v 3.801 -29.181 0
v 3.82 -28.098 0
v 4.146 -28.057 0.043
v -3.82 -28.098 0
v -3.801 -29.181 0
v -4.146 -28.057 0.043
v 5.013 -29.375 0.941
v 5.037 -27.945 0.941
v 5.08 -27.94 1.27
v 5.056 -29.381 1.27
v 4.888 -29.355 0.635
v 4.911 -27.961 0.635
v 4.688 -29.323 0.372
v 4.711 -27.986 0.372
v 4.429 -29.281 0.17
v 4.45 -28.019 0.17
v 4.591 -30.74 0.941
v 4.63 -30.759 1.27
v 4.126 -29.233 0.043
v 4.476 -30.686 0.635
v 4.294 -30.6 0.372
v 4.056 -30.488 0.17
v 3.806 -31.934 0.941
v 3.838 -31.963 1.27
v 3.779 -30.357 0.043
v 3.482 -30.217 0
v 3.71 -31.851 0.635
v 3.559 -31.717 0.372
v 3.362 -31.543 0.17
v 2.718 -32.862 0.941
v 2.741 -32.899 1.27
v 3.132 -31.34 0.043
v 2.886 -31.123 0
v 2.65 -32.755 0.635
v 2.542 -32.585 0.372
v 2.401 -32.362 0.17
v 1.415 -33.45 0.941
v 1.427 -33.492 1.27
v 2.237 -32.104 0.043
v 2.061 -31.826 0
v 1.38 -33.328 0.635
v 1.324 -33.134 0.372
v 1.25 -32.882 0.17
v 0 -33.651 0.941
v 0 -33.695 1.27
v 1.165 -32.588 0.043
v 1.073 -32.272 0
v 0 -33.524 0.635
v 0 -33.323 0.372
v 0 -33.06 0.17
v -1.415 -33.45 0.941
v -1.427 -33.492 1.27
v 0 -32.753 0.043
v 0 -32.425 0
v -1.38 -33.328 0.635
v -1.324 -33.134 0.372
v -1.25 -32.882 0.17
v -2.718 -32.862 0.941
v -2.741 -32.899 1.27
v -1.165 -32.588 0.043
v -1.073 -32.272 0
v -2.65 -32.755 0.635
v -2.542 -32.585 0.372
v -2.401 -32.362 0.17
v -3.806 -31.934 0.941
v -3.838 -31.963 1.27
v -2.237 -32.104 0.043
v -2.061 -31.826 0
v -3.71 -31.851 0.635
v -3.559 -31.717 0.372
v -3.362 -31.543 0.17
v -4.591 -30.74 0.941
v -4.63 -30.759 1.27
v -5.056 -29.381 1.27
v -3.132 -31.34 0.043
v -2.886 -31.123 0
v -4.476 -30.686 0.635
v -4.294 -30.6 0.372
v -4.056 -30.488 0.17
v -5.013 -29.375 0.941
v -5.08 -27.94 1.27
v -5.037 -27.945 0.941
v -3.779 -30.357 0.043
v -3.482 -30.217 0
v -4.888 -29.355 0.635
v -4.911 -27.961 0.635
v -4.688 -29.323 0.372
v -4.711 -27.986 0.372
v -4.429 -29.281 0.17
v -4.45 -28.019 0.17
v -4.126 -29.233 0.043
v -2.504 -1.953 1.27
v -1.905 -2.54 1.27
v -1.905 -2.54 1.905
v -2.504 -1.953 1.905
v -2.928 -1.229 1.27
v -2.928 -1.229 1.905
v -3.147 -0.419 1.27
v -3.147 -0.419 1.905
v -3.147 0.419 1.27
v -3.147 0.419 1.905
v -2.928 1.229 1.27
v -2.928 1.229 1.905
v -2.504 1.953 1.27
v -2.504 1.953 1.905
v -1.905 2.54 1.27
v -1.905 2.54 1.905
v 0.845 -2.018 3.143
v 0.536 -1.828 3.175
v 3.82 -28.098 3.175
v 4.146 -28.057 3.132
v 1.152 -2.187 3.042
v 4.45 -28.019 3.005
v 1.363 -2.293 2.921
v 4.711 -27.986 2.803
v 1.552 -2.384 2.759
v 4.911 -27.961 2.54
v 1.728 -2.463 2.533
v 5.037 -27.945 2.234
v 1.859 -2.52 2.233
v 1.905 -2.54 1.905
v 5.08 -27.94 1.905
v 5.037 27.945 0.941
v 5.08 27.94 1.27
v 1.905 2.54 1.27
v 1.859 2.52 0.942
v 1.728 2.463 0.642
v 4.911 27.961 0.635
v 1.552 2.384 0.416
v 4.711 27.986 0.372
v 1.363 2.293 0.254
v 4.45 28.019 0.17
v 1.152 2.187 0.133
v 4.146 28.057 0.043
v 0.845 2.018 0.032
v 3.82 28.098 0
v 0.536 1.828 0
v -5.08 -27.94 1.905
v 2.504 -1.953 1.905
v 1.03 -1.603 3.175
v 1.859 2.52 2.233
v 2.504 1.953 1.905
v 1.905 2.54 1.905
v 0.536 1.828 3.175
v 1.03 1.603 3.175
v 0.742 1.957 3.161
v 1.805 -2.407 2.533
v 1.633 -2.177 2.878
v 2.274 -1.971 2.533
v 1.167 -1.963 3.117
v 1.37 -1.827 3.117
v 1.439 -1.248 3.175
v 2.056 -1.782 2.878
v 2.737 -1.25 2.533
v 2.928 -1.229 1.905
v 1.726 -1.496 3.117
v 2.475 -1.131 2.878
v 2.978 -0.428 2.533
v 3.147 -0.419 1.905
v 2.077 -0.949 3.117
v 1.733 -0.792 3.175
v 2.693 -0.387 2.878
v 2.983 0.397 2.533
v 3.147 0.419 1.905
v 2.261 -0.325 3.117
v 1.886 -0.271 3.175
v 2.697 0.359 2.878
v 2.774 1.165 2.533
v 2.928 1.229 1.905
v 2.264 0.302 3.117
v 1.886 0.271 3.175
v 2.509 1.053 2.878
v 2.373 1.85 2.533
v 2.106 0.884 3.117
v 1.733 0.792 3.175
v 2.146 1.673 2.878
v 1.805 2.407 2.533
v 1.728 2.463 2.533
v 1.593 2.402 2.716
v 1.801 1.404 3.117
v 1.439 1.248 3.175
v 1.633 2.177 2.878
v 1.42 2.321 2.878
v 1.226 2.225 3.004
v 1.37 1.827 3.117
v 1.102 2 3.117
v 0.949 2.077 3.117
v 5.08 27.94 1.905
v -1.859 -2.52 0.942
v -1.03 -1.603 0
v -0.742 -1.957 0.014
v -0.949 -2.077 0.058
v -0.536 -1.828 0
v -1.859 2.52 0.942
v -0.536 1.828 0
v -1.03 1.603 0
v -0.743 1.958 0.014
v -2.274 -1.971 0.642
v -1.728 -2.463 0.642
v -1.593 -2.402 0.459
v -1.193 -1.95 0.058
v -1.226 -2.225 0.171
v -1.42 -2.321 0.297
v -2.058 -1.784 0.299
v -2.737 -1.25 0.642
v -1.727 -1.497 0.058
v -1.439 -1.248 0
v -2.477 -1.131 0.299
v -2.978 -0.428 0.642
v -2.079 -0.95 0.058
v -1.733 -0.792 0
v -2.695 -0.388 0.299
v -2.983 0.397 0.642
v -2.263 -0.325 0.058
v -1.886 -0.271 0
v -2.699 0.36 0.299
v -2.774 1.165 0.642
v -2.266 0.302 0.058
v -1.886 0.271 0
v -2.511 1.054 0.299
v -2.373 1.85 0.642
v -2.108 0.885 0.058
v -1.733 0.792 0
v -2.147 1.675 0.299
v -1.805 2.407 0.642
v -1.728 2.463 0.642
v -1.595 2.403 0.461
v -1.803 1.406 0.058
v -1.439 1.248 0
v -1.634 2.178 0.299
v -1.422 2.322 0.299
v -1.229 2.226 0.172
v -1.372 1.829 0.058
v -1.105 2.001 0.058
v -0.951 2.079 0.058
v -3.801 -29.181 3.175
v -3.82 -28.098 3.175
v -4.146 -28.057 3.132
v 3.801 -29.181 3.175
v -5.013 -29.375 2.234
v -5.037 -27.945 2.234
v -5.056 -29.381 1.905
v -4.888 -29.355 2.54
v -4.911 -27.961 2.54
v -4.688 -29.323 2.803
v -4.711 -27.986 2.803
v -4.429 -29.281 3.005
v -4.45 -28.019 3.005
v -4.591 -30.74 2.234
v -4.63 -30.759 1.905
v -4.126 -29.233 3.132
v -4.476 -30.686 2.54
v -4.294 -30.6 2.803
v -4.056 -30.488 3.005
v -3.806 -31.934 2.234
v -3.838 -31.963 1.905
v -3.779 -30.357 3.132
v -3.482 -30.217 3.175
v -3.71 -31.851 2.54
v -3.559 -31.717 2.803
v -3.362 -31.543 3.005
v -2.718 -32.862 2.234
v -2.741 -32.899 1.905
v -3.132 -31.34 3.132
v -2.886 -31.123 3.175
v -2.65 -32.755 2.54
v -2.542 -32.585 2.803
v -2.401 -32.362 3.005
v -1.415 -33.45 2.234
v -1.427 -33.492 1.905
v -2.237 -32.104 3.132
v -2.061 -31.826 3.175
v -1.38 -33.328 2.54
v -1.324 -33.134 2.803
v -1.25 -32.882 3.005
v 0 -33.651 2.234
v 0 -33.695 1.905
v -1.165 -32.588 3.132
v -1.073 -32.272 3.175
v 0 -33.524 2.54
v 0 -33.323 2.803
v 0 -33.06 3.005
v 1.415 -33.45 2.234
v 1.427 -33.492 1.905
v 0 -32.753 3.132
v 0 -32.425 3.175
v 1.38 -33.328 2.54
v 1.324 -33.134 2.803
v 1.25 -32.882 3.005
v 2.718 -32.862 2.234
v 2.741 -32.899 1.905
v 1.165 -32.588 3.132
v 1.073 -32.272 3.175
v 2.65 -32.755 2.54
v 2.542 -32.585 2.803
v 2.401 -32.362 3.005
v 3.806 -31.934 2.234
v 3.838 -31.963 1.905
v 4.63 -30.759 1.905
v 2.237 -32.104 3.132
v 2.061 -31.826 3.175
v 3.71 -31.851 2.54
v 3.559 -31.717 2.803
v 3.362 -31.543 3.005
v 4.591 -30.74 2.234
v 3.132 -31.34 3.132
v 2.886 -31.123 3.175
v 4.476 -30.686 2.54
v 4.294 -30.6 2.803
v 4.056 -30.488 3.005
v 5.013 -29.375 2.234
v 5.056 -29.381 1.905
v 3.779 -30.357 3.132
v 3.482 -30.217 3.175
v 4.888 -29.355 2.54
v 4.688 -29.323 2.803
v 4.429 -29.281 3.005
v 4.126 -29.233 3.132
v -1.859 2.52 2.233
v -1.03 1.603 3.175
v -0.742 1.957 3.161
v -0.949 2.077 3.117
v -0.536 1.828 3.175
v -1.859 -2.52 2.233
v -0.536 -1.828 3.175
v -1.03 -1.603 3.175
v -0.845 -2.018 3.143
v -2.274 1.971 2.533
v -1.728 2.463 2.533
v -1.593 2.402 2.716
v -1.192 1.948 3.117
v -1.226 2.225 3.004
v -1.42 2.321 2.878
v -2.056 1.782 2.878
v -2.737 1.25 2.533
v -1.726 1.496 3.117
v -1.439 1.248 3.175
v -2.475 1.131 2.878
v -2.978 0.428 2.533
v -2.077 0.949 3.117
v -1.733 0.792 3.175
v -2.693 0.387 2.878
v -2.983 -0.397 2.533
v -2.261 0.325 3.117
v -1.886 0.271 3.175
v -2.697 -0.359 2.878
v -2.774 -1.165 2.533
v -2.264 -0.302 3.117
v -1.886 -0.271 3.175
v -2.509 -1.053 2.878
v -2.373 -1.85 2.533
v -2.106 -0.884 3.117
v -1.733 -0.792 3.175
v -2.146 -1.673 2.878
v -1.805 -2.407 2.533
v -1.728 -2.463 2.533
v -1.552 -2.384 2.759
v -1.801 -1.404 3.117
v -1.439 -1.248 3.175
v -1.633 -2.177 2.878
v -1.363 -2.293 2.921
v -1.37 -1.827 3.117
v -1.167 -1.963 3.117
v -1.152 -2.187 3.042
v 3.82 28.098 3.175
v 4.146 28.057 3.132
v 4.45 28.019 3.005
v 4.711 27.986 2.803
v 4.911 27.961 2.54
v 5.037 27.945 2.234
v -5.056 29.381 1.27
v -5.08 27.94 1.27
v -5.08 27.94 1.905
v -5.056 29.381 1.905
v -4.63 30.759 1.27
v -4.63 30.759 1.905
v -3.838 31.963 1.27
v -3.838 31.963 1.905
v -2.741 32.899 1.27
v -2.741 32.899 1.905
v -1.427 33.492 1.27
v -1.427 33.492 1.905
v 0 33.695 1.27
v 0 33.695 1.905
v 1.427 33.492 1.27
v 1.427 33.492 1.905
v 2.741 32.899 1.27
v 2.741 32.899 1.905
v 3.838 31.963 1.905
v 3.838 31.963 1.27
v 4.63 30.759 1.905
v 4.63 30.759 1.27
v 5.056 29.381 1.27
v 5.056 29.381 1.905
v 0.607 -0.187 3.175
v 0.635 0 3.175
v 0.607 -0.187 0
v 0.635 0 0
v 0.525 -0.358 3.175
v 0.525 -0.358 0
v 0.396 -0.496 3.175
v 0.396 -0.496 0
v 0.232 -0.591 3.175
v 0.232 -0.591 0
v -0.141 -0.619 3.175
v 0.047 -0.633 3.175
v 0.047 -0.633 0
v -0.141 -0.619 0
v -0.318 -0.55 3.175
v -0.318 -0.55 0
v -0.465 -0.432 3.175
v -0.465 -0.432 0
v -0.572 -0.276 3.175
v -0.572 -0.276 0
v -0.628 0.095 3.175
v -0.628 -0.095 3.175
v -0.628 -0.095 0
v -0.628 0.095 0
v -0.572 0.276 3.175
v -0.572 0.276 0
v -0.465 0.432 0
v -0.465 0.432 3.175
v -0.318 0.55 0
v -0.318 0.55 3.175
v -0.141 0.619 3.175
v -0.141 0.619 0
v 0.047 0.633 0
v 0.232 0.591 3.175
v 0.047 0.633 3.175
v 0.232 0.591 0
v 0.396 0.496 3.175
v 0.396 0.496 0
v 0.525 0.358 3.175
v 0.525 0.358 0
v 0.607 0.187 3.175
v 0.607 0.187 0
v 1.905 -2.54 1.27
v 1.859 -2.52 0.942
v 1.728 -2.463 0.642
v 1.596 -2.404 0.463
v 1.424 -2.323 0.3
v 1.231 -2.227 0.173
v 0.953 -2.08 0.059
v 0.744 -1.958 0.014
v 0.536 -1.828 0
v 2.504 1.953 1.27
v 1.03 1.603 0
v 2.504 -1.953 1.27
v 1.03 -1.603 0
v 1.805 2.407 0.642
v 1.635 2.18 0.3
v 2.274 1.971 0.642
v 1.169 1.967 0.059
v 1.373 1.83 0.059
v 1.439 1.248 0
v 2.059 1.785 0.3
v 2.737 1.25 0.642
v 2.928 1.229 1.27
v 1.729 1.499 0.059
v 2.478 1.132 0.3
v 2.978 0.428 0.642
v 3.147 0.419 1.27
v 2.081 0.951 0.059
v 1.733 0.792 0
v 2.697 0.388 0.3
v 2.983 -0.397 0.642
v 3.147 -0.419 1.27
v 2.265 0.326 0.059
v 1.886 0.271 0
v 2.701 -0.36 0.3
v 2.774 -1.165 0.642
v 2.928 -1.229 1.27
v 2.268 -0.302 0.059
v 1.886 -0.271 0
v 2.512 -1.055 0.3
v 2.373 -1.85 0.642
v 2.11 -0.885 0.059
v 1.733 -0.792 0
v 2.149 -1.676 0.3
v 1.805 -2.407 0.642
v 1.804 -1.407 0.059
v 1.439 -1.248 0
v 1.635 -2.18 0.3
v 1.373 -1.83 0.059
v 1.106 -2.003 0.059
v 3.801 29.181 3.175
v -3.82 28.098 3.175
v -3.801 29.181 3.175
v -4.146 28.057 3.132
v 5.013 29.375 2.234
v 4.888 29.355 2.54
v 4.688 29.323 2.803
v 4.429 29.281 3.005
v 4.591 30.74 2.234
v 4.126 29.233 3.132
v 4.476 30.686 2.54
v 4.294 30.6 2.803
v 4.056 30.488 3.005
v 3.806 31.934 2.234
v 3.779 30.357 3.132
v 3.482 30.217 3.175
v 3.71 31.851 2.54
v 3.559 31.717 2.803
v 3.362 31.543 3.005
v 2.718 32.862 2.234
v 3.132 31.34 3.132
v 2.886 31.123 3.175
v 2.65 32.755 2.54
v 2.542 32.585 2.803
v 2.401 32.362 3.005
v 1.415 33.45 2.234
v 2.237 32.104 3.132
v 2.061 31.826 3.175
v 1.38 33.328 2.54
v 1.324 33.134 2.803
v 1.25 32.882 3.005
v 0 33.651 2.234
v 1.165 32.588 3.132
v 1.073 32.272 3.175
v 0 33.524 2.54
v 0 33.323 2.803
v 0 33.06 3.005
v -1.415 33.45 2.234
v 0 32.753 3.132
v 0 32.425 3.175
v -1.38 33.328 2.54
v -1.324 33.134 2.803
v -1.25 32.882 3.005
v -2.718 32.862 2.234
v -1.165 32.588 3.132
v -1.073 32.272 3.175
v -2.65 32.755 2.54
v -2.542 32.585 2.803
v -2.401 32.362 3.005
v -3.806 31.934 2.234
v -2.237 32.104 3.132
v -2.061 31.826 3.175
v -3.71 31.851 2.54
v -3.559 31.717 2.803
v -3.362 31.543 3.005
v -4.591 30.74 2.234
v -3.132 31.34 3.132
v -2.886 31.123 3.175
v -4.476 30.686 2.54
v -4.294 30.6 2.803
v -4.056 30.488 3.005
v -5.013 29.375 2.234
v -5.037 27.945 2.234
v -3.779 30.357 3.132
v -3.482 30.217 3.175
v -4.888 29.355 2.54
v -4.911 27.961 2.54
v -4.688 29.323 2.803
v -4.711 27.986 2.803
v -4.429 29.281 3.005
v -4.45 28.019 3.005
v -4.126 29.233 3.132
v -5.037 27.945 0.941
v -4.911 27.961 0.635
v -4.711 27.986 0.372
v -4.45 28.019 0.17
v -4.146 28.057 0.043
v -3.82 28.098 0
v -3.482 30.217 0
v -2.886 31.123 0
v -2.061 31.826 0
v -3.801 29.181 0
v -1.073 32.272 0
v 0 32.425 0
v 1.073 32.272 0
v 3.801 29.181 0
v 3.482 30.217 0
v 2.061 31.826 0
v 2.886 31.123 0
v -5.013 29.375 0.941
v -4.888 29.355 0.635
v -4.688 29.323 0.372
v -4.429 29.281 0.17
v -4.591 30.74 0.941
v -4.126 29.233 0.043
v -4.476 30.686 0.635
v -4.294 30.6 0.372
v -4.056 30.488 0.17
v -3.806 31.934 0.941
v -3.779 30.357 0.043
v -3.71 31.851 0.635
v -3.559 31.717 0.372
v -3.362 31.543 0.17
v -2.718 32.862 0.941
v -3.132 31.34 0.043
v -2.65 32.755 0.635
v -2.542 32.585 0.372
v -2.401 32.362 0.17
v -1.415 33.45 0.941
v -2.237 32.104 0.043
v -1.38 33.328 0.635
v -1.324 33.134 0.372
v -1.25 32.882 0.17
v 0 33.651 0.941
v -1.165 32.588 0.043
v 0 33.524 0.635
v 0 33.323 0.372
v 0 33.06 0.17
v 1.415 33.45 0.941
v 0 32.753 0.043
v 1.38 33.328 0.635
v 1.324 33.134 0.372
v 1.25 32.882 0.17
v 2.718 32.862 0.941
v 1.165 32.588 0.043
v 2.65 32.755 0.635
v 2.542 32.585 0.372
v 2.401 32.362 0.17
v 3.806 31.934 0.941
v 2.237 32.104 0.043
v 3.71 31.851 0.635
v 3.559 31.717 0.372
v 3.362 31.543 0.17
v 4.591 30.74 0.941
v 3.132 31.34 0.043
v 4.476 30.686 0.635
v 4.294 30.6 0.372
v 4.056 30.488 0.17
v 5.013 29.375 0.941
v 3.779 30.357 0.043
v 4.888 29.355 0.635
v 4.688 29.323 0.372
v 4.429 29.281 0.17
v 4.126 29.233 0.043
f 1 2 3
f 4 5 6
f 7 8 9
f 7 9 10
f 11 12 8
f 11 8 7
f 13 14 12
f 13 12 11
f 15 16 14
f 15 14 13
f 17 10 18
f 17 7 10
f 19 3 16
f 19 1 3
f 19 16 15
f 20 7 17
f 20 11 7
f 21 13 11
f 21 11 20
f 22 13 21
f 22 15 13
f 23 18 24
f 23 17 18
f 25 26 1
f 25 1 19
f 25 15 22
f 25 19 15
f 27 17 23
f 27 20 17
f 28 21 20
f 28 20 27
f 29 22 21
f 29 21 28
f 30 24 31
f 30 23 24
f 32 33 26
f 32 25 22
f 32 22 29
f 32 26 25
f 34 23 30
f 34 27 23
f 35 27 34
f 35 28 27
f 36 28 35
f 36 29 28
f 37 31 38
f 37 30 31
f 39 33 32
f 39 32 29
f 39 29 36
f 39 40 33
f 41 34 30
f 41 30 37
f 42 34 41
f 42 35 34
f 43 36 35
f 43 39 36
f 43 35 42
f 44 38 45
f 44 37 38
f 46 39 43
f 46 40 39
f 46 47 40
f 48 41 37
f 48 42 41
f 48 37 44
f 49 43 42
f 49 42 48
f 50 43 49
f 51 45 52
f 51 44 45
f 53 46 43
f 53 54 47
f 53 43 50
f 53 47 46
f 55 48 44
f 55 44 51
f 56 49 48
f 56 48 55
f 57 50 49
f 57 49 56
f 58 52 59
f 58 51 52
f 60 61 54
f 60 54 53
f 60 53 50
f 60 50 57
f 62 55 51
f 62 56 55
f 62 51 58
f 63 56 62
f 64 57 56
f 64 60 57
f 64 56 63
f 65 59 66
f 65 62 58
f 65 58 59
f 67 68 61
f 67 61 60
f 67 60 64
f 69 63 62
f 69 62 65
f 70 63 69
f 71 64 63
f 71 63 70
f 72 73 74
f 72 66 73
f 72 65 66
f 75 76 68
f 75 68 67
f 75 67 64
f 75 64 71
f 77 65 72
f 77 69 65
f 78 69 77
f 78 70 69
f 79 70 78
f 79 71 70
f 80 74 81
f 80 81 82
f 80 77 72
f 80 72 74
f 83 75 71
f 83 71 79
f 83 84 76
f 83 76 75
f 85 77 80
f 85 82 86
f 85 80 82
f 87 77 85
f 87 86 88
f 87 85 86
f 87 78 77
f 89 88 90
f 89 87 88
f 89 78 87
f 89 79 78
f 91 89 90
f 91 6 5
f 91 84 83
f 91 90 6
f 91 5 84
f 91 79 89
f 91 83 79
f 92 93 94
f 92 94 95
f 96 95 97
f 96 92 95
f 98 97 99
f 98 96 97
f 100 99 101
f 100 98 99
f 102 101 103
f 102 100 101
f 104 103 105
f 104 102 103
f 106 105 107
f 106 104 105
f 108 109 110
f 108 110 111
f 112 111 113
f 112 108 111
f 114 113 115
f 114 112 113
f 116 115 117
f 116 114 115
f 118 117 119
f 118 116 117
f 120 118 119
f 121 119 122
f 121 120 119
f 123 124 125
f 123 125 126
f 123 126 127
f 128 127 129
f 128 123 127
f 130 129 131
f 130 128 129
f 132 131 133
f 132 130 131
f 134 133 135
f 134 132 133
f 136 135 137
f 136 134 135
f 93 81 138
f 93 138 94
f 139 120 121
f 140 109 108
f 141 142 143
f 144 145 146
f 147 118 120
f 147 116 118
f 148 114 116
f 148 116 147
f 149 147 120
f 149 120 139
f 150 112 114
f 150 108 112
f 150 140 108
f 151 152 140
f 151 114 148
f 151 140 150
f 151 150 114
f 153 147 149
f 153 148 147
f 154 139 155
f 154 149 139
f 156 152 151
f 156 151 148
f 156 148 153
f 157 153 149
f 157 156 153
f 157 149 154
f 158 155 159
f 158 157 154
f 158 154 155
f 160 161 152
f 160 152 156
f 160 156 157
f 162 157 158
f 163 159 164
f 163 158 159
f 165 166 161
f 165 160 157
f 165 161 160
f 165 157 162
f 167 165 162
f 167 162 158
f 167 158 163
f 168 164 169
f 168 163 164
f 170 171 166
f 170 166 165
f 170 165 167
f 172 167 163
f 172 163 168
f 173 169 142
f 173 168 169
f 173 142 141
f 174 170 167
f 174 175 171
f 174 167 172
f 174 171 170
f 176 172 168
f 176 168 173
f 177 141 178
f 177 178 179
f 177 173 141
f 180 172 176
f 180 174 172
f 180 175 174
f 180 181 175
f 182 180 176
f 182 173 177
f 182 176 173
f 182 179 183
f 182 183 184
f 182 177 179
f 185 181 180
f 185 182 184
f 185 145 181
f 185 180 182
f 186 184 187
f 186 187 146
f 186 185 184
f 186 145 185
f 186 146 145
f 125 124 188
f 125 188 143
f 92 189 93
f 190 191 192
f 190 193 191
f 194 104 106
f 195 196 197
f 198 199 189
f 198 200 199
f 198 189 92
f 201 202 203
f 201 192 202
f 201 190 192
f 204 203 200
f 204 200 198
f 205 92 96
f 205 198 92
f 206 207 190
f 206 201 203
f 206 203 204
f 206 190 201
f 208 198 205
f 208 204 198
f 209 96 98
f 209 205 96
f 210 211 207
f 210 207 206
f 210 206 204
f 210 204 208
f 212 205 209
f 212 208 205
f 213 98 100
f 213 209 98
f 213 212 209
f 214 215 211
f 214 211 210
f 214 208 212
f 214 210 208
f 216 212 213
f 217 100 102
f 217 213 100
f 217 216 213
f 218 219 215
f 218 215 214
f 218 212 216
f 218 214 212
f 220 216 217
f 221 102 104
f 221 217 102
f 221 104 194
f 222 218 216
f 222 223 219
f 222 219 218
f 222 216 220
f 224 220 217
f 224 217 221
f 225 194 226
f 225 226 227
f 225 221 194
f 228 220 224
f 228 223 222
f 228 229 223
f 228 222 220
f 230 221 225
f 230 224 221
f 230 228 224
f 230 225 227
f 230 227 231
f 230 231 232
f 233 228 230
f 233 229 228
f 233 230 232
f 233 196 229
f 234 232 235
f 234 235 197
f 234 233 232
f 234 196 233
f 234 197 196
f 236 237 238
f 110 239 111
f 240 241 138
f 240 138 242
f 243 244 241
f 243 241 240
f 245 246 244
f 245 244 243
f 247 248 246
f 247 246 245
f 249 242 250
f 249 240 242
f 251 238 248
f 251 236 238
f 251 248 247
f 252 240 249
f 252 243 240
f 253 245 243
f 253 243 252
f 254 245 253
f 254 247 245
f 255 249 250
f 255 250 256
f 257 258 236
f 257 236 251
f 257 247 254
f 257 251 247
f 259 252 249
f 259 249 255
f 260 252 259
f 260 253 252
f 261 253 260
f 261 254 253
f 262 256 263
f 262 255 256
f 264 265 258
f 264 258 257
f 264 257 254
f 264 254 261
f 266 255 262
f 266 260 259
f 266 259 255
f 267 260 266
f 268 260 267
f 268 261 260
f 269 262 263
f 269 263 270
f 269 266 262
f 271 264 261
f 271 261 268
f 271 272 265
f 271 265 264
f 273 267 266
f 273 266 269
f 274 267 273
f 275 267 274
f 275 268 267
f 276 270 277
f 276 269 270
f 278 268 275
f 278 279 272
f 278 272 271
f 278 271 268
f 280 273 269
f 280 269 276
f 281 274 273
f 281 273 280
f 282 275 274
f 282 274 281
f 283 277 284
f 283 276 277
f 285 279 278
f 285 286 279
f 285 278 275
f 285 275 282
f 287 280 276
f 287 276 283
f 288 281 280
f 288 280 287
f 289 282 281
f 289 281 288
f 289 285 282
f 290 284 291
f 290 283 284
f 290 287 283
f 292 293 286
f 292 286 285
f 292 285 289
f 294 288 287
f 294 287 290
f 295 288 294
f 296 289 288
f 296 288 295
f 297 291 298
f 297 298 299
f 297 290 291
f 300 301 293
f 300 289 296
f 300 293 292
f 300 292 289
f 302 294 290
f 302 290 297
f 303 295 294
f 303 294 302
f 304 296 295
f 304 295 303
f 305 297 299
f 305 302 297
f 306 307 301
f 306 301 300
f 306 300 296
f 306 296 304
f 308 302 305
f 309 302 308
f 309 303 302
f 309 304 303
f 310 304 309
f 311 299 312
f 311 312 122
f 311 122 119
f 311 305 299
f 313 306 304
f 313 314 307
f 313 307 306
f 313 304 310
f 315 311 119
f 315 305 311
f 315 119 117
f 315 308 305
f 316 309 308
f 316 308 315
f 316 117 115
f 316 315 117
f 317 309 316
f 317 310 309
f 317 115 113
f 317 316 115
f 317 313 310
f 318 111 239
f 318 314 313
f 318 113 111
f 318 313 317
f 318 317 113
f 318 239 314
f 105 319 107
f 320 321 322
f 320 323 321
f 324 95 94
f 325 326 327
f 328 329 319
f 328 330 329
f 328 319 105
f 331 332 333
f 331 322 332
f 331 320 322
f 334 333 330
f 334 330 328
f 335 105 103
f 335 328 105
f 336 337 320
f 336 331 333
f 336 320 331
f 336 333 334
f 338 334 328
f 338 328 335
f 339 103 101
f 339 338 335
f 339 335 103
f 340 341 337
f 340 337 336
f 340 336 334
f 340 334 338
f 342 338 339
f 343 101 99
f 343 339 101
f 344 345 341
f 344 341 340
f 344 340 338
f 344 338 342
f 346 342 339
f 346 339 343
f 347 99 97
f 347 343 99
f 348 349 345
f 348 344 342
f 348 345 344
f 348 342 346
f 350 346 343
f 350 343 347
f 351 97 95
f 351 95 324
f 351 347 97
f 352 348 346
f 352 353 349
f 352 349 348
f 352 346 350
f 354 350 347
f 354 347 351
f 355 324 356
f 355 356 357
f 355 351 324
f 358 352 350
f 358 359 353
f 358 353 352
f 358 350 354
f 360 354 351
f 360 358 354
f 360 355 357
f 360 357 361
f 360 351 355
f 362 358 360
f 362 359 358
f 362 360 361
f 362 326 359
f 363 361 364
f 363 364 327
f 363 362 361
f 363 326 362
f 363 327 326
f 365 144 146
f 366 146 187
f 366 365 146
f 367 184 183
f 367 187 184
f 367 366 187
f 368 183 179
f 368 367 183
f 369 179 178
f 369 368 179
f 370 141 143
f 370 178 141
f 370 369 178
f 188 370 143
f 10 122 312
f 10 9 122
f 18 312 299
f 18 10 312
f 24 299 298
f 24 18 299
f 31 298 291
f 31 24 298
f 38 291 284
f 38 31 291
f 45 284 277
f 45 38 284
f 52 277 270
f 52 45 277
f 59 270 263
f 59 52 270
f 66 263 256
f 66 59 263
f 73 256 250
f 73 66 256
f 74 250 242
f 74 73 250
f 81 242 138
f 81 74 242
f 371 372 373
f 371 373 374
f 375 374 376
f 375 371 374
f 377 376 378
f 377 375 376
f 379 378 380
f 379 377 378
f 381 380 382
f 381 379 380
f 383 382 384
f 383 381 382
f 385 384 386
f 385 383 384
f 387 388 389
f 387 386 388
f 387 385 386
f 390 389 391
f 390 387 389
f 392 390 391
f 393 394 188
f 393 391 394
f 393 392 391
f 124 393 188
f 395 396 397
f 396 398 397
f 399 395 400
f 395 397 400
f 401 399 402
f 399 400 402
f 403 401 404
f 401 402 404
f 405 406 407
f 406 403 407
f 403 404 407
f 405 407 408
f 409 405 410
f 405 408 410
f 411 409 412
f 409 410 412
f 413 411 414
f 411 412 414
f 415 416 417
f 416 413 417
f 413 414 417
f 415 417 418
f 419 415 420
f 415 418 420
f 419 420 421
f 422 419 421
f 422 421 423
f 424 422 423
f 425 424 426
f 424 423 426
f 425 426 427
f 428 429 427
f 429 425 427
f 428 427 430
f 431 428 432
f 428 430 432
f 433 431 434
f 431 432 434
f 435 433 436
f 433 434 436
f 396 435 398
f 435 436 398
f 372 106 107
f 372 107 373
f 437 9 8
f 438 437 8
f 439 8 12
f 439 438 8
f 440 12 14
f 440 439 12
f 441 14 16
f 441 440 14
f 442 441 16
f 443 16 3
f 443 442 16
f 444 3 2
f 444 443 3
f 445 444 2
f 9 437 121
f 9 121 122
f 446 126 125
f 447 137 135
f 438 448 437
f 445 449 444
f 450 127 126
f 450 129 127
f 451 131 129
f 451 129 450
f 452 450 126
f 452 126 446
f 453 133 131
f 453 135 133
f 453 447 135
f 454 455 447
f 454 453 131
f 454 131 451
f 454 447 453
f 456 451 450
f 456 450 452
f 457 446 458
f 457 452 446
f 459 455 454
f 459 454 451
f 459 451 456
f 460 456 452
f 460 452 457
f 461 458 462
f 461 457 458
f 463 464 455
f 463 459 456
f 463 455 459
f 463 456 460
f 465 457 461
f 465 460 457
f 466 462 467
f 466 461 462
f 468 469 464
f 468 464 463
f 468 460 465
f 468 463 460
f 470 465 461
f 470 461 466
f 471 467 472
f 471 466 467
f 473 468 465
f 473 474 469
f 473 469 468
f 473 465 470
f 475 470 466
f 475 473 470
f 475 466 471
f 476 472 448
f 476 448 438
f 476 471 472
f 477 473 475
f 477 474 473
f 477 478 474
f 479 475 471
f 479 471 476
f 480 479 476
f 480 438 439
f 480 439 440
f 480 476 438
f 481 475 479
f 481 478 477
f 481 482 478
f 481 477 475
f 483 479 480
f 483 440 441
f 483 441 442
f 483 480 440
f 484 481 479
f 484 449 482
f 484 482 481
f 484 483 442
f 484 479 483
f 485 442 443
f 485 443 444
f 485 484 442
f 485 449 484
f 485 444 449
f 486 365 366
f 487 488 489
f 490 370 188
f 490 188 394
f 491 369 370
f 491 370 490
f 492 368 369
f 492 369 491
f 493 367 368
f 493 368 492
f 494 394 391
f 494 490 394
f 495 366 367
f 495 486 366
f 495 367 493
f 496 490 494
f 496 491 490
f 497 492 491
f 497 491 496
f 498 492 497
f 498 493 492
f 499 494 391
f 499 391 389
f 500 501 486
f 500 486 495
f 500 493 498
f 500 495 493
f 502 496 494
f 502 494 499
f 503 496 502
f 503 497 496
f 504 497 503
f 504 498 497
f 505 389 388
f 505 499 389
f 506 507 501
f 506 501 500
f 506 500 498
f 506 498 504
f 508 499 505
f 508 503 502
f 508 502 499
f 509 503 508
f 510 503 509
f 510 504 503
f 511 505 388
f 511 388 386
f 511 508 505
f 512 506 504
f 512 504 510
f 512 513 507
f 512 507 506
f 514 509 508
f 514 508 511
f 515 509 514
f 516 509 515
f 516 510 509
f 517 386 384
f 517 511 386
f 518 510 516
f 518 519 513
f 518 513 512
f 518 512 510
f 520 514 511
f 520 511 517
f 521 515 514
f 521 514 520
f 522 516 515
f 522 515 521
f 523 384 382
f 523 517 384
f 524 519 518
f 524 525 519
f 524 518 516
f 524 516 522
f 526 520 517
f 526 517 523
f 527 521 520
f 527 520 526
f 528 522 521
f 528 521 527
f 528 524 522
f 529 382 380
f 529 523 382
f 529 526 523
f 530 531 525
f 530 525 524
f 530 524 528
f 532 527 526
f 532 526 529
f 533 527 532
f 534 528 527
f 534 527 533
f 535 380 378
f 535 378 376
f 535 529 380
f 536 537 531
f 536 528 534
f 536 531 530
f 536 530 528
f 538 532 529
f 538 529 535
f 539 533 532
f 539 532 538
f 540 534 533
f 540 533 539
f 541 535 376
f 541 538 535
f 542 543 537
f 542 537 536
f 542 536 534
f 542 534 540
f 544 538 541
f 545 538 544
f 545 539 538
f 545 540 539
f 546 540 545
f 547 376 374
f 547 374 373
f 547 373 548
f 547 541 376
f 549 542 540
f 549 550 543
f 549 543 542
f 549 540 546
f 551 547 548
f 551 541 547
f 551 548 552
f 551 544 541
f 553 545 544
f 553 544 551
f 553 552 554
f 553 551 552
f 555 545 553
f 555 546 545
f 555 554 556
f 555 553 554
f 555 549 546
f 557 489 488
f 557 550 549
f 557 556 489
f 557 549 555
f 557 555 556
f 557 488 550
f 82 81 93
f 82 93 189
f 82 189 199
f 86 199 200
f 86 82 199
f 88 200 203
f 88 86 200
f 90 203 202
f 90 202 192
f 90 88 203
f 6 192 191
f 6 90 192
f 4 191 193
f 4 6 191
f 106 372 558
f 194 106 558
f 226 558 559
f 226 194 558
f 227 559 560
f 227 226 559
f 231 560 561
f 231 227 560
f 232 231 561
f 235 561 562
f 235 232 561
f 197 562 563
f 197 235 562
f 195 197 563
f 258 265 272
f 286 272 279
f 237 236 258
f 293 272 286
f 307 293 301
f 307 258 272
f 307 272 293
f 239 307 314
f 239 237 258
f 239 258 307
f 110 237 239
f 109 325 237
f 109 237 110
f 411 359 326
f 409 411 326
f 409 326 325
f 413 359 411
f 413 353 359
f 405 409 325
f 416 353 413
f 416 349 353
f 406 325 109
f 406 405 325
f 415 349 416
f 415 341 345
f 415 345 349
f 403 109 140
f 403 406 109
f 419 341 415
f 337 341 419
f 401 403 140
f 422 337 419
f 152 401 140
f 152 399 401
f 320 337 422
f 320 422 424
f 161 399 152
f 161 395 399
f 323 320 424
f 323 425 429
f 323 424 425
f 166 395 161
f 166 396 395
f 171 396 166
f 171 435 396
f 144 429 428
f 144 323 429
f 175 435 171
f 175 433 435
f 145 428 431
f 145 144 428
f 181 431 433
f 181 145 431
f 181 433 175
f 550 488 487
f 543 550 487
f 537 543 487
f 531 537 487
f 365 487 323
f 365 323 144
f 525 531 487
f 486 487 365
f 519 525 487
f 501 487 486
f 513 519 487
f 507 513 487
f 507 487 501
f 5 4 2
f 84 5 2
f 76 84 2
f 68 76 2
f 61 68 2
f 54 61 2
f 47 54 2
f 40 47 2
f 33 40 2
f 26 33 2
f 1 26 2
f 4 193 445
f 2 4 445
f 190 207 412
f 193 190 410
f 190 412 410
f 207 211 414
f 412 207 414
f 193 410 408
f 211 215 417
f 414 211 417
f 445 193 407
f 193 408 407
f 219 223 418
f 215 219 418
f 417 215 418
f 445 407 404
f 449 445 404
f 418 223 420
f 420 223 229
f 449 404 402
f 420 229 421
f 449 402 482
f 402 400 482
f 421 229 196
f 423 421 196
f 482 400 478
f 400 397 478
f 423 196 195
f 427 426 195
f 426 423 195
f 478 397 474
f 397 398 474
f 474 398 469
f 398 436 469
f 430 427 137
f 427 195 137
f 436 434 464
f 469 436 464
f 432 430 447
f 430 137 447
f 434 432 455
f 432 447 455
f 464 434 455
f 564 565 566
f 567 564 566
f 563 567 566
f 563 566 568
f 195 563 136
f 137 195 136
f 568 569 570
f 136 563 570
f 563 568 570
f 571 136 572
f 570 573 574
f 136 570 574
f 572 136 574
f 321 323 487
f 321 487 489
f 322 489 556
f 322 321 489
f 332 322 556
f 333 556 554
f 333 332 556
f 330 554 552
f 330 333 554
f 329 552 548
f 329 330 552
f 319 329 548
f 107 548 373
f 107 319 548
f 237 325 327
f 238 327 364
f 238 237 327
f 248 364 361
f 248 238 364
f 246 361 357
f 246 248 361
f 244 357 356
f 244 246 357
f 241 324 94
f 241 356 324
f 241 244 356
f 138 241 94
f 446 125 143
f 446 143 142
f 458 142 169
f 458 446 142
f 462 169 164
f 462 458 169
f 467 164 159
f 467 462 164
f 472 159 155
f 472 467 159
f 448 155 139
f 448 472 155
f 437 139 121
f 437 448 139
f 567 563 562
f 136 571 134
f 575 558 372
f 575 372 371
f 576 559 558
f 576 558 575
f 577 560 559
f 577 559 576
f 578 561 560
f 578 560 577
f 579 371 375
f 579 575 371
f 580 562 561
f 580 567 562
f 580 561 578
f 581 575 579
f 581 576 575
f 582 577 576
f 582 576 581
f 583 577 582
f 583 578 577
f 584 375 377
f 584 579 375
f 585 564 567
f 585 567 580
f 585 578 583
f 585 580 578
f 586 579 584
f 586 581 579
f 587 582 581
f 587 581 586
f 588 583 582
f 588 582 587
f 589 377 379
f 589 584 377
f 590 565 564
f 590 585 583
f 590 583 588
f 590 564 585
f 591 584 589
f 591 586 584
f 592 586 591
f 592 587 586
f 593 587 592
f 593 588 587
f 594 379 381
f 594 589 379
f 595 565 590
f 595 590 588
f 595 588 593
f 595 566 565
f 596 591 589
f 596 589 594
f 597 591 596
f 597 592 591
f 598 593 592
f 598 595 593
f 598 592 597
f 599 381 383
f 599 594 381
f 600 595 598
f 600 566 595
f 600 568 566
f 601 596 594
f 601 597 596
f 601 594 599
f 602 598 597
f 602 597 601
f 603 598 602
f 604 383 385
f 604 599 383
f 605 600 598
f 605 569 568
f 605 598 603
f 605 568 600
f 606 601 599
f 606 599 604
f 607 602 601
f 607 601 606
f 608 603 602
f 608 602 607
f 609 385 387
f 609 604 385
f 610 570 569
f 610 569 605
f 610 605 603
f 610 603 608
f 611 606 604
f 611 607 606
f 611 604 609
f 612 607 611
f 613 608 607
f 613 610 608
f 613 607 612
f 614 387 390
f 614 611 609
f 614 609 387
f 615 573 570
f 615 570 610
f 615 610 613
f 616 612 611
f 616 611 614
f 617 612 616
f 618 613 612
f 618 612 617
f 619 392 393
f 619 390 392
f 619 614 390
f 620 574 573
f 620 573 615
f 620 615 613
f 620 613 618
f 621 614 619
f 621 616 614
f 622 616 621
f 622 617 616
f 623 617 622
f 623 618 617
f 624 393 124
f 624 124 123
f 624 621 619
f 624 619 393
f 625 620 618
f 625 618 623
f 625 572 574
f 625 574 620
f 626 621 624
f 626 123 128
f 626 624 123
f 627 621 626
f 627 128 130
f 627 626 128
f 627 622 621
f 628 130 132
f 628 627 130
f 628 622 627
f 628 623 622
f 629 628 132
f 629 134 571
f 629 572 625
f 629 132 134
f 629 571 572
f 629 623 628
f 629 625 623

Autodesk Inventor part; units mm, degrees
ref_plane "YZ Plane" through (0, 0, 0) normal (1, 0, 0) x (0, 1, 0)
ref_plane "XZ Plane" through (0, 0, 0) normal (0, 1, 0) x (-1, 0, 0)
ref_plane "XY Plane" through (0, 0, 0) normal (0, 0, 1) x (1, 0, 0)
sketch "Sketch1" plane through (0, 0, 0) normal (0, 0, 1) x (1, 0, 0)
  circle A0 centre (0, 0) radius 0.635
  line L0 (-1.905, 2.54) -> (-5.08, 27.94)
  line L1 (5.08, 27.94) -> (1.905, 2.54)
  line L2 (-5.08, -27.94) -> (-1.905, -2.54)
  line L3 (1.905, -2.54) -> (5.08, -27.94)
  arc A1 (-5.08, -27.94) -> (5.08, -27.94) centre (0, -28.575) ccw
  arc A2 (5.08, 27.94) -> (-5.08, 27.94) centre (0, 28.575) ccw
  arc A3 (-1.905, 2.54) -> (-1.905, -2.54) centre (0, 0) ccw
  arc A4 (1.905, -2.54) -> (1.905, 2.54) centre (0, 0) ccw
  dimension "d0" = 1.27
  dimension "d3" = 2.54
  dimension "d4" = 1.905
  dimension "d5" = 2.54
  dimension "d6" = 1.905
  dimension "d7" = 25.4
  dimension "d8" = 25.4
  dimension "d9" = 3.175
  dimension "d10" = 3.175
  dimension "d11" = 25.4
  dimension "d12" = 25.4
  dimension "d13" = 3.175
  dimension "d14" = 3.175
extrude "Extrusion1" add sketch "Sketch1" along normal blind 3.175
fillet "Fillet1" radius 1.27 16 edges at (0, 33.6945, 3.175) (-3.4925, 15.24, 3.175) (3.4925, 15.24, 3.175) (0, -33.6945, 3.175) (-3.4925, -15.24, 3.175) (3.4925, -15.24, 3.175) (0, -33.6945, 0) (-3.4925, -15.24, 0) (3.4925, -15.24, 0) (0, 33.6945, 0) (-3.4925, 15.24, 0) (3.4925, 15.24, 0) (3.175, 0, 3.175) (-3.175, 0, 3.175) (3.175, 0, 0) (-3.175, 0, 0)
properties part number "Prop" material "Nylon 6/6"
